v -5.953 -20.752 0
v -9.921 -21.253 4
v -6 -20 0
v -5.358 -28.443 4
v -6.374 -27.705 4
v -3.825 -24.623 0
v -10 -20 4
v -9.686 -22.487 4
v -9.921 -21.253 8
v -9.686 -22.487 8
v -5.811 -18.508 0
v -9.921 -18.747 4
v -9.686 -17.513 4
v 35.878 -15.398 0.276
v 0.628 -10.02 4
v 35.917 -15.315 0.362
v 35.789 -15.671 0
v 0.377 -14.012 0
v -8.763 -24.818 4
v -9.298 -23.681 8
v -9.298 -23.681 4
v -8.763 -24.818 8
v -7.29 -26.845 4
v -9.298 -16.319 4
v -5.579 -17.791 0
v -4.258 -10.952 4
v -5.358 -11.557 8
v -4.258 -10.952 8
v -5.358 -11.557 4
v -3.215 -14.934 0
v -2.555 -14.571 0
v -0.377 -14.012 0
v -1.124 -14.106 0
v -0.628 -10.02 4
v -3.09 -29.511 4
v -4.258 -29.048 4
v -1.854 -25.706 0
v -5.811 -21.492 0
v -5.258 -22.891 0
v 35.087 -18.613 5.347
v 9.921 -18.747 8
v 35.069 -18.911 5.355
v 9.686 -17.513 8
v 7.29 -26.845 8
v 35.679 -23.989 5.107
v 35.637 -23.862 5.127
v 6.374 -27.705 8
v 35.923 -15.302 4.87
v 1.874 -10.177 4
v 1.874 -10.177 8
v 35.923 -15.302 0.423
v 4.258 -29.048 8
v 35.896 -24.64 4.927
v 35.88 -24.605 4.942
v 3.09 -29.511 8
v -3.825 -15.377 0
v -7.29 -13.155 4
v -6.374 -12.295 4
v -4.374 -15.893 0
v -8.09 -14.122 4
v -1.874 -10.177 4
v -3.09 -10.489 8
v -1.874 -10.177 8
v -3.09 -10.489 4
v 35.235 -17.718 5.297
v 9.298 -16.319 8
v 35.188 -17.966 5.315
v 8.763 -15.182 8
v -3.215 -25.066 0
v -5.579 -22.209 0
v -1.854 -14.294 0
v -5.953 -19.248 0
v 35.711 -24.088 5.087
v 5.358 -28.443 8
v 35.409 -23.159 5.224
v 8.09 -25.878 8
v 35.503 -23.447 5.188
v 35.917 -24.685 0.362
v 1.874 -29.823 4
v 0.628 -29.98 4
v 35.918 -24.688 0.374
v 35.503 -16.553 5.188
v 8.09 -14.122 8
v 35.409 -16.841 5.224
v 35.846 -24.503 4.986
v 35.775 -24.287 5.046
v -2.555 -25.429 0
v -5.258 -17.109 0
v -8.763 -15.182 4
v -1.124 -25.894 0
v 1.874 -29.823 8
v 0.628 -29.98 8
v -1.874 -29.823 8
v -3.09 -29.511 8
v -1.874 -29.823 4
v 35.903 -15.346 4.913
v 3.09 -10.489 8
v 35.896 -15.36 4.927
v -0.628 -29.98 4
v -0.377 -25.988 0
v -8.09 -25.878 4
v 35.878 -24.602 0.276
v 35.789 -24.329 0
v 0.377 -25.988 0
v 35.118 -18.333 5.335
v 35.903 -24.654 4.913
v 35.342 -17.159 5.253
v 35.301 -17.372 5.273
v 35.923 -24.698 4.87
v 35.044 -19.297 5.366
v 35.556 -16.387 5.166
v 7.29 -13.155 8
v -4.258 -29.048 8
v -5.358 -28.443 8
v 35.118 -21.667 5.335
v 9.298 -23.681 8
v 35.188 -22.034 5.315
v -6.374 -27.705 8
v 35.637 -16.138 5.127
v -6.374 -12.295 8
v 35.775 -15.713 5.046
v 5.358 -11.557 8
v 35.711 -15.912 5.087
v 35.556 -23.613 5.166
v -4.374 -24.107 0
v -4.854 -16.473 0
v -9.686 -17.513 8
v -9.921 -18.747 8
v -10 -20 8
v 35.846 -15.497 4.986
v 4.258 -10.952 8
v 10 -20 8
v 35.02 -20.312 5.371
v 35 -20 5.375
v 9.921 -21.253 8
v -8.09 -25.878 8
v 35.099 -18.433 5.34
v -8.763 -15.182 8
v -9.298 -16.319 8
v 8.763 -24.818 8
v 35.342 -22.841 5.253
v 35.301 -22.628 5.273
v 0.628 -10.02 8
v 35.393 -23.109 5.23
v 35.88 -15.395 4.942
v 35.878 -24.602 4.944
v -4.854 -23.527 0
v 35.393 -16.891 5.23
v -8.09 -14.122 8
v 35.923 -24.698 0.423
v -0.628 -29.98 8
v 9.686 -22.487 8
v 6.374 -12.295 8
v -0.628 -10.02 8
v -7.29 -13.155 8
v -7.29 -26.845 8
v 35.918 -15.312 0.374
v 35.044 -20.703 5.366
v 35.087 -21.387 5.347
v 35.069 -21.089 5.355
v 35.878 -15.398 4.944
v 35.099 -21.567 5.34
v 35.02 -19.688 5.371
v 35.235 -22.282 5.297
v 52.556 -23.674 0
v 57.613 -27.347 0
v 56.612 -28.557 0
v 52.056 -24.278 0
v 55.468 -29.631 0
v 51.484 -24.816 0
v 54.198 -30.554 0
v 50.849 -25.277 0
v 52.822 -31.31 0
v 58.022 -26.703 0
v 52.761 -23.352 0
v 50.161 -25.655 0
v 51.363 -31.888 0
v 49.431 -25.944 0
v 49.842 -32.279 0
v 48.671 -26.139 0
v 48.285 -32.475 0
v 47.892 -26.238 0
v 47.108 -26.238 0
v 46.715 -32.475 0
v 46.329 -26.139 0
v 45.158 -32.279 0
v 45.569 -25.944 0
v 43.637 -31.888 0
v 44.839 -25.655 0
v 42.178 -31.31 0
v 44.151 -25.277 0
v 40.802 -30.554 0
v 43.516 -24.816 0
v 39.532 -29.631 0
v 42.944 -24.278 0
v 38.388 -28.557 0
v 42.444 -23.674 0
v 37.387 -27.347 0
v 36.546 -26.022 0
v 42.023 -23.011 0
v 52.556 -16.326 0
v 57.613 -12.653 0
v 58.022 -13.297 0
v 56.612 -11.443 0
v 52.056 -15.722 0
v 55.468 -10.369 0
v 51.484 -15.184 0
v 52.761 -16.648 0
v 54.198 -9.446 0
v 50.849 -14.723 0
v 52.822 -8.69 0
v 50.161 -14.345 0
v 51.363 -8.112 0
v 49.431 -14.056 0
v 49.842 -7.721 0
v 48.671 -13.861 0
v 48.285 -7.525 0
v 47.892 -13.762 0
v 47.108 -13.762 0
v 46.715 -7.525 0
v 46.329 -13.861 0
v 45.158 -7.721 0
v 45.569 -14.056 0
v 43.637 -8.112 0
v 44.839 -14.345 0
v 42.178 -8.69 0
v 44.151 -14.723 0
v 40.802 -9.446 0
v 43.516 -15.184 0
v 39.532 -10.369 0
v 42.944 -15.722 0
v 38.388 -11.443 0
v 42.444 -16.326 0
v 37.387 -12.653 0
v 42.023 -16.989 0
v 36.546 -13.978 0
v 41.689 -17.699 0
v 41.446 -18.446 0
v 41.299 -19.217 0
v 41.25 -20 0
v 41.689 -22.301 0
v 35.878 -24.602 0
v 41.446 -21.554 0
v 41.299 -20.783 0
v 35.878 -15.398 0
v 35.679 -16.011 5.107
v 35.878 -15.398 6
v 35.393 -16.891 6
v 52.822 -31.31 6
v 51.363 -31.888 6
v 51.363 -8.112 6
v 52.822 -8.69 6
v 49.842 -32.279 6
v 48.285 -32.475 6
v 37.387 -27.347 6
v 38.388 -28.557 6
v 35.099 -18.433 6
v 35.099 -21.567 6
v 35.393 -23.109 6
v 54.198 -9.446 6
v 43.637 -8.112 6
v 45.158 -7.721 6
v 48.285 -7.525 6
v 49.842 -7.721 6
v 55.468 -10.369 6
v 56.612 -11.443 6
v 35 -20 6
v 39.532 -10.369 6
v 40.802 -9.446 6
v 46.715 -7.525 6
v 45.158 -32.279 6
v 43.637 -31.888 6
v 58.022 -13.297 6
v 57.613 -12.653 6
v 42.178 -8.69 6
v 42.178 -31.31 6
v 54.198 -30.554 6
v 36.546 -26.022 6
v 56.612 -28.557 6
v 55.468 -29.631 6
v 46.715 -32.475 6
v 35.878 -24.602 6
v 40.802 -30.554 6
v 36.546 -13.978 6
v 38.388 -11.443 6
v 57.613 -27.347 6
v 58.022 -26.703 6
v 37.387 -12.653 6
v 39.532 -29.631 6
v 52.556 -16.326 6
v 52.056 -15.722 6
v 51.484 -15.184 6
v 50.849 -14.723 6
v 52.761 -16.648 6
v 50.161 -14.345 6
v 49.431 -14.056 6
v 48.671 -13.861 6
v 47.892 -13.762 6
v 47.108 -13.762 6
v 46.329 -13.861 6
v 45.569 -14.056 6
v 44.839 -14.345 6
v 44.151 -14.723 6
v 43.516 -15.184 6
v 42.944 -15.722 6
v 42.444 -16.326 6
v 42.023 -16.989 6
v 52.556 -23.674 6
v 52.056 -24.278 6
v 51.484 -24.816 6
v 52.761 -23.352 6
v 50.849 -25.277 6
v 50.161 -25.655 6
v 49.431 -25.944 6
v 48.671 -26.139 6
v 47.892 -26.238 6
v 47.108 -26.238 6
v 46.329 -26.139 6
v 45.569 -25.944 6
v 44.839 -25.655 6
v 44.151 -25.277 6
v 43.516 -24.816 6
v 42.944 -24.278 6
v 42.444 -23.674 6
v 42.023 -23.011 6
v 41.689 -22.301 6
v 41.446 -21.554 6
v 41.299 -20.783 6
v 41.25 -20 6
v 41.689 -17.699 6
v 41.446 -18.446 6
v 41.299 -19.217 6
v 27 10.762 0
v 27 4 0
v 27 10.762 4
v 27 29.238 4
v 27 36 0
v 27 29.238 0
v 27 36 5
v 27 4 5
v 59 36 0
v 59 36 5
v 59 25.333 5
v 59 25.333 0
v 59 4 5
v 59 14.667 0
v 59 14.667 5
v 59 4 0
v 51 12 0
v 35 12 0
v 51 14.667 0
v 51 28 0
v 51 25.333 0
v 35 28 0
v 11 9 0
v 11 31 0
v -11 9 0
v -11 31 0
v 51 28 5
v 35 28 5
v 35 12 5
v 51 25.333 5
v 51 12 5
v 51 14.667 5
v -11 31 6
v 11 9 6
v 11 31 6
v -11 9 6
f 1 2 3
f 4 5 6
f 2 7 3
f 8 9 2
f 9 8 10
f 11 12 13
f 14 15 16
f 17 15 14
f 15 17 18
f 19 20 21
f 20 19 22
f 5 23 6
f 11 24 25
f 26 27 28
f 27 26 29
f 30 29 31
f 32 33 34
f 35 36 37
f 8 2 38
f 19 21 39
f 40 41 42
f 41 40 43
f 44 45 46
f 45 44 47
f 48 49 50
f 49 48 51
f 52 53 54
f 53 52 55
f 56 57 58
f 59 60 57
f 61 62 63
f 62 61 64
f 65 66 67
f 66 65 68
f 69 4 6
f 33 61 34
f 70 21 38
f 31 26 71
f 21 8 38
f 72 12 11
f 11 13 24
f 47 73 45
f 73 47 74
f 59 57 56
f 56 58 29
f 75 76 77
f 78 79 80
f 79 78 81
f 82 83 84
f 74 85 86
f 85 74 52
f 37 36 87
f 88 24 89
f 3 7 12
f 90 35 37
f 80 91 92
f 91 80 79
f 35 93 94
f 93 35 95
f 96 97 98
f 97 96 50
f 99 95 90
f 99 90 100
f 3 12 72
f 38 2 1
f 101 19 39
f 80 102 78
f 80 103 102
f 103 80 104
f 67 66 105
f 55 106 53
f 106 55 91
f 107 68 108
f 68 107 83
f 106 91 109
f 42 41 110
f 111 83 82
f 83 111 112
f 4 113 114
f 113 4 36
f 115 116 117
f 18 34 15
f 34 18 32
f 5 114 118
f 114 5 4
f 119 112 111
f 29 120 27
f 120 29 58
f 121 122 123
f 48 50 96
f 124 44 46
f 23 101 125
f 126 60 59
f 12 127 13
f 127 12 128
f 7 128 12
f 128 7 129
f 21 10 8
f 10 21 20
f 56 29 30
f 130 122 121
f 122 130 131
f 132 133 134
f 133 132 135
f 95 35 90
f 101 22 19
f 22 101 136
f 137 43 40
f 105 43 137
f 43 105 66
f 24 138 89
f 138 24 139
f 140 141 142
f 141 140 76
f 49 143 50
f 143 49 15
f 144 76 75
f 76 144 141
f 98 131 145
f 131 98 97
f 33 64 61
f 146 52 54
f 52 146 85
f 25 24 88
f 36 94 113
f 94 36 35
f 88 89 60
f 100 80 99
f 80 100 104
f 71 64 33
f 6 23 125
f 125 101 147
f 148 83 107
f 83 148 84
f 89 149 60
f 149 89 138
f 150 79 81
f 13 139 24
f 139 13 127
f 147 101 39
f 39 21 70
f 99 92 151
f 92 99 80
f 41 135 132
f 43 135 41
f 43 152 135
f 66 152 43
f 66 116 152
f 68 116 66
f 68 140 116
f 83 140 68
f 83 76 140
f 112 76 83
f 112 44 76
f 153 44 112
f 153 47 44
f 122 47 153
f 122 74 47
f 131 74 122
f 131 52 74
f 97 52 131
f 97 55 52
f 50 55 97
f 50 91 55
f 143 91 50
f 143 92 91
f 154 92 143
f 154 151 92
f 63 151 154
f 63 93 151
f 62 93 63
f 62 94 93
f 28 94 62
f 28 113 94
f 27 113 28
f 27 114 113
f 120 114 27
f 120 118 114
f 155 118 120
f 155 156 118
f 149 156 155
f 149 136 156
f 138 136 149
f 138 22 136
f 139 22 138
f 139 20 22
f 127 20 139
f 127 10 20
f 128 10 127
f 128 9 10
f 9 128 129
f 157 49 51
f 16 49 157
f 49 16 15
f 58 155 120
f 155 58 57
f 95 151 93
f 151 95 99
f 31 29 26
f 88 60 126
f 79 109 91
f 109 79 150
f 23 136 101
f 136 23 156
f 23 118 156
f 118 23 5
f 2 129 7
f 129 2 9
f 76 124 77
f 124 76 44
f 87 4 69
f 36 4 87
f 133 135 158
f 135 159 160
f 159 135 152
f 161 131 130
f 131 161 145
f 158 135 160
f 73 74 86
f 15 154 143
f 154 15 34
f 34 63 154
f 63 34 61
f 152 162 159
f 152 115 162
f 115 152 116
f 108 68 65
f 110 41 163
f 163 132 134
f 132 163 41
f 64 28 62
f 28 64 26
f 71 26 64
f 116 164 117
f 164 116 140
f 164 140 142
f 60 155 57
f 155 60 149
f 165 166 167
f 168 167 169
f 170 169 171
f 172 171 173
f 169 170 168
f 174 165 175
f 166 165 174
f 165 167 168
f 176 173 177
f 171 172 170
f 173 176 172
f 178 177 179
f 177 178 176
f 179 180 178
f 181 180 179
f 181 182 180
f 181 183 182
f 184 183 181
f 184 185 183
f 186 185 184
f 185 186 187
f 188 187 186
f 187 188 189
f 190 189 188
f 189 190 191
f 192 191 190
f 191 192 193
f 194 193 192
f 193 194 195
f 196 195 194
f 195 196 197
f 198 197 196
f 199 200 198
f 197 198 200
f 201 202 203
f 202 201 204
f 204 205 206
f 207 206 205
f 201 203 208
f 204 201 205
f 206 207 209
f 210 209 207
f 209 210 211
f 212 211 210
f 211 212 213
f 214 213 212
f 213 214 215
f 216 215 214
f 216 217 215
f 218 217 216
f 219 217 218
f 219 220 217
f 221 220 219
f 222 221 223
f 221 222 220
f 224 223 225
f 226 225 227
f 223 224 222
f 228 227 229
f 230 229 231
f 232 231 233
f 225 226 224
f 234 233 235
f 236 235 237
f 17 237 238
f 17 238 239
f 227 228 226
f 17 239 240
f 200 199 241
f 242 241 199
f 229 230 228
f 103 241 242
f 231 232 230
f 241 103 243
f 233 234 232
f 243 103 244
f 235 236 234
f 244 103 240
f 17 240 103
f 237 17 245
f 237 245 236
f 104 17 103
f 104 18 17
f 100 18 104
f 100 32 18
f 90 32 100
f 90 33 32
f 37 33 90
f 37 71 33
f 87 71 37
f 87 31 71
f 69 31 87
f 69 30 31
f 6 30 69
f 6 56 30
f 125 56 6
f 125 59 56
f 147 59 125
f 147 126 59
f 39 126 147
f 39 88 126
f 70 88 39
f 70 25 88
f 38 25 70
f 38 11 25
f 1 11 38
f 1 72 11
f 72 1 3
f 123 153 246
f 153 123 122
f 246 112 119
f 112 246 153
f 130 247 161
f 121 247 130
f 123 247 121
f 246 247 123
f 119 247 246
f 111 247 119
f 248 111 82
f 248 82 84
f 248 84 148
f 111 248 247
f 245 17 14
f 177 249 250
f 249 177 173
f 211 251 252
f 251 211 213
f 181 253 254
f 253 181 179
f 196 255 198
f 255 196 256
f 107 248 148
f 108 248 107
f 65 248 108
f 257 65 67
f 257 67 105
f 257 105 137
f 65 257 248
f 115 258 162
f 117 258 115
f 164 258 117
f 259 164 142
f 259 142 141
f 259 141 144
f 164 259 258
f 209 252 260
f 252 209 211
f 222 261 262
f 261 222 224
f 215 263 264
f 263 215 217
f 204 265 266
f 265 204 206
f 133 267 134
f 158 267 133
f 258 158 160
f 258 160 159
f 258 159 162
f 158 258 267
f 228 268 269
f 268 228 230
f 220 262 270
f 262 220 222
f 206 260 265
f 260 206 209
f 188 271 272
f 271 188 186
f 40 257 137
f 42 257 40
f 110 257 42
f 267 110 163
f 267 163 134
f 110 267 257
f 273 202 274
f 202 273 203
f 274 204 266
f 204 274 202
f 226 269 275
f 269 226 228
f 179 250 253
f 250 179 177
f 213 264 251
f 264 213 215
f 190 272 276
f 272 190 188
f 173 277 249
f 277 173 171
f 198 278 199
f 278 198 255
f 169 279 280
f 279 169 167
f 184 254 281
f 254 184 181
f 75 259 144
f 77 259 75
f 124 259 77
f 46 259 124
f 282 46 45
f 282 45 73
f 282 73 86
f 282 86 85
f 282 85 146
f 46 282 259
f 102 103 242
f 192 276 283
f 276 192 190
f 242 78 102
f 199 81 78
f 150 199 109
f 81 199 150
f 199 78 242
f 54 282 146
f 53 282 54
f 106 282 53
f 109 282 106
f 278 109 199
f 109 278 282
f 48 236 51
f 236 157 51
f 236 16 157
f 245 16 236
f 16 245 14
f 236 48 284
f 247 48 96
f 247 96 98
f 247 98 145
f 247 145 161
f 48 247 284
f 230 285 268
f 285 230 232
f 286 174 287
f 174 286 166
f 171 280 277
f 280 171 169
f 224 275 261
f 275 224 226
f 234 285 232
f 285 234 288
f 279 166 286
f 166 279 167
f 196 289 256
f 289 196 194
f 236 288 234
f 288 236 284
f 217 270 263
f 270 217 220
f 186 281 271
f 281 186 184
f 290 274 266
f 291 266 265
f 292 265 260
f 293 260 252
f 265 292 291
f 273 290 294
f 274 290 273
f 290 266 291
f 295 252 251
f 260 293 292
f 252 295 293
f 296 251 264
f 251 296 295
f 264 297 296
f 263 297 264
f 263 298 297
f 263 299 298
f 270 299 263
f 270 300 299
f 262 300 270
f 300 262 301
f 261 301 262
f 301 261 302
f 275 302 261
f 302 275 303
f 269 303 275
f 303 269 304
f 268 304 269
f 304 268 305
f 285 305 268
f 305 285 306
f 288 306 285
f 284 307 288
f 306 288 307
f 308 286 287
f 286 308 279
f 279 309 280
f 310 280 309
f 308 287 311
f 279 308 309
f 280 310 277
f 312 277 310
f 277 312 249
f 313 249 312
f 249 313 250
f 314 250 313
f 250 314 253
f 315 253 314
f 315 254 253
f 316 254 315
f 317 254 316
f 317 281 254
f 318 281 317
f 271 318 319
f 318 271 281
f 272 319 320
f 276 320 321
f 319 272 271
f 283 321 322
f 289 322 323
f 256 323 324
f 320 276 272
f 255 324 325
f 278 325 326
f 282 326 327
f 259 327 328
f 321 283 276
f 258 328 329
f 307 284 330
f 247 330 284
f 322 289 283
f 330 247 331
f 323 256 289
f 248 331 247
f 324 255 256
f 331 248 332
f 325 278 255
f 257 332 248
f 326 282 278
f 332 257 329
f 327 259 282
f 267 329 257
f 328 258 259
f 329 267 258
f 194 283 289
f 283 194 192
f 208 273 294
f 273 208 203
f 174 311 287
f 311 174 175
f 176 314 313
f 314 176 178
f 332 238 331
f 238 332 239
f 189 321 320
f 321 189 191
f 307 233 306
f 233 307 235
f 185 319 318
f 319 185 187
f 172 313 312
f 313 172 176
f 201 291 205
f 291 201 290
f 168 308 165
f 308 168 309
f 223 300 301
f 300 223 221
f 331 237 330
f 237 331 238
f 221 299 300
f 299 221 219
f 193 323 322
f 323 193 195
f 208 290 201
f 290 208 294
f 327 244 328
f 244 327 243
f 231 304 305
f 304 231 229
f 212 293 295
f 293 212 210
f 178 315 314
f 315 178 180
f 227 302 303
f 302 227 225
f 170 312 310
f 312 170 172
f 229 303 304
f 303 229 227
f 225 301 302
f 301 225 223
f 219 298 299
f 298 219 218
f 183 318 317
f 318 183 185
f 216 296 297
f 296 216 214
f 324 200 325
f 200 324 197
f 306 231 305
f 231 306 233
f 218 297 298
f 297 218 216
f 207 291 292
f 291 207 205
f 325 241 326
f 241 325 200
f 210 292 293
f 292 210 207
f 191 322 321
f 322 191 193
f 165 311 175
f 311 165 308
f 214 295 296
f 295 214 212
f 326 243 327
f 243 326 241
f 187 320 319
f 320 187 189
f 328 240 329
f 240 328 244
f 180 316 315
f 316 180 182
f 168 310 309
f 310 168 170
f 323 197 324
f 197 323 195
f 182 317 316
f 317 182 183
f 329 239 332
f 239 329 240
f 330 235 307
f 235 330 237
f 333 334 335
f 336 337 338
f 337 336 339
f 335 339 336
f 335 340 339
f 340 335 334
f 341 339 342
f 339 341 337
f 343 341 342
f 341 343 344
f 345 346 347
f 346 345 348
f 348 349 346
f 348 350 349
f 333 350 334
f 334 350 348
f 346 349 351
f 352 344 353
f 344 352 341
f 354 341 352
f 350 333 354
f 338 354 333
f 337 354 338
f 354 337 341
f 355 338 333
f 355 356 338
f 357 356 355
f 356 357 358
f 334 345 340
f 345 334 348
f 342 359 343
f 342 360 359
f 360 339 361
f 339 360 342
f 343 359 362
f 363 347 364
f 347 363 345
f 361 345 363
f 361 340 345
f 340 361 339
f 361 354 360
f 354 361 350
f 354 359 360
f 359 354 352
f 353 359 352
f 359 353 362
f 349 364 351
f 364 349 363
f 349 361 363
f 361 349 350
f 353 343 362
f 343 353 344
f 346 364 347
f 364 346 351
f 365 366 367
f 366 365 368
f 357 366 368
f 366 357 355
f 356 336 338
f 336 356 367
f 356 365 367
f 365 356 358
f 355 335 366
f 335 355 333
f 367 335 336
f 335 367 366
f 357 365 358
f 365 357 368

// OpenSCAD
// file: ../utilities/transformations_oblomobka.scad
// Transformations
// (C) @oblomobka - 2014
// GPL3

// Transforma una forma en un sector según un ángulo dado.

module sector(	angle, 	// es el ángulo del sector, lo que quedará de la forma original
				d,		// valor auxiliar, será como mínimo igual al diámetro del cilindro que envuelve la forma original
				h		// valor auxiliar, será como mínimo igual a la altura del cilindro que envuelve la forma original
				){

POINTS=[	[0,0,-h],
		[0,0,h],
		[d*cos(0*angle/4),d*sin(0*angle/4),-h],
		[d*cos(0*angle/4),d*sin(0*angle/4),h],
		[d*cos(1*angle/4),d*sin(1*angle/4),-h],
		[d*cos(1*angle/4),d*sin(1*angle/4),h],
		[d*cos(2*angle/4),d*sin(2*angle/4),-h],
		[d*cos(2*angle/4),d*sin(2*angle/4),h],
		[d*cos(3*angle/4),d*sin(3*angle/4),-h],
		[d*cos(3*angle/4),d*sin(3*angle/4),h],
		[d*cos(4*angle/4),d*sin(4*angle/4),-h],
		[d*cos(4*angle/4),d*sin(4*angle/4),h],
		];

TRIANGLES=[	[0,1,2],
			[1,3,2],
			[2,3,4],
			[3,5,4],
			[4,5,6],
			[5,7,6],
			[6,7,8],
			[7,9,8],
			[8,9,10],
			[9,11,10],
			[10,11,0],
			[11,1,0],

			[5,3,1],
			[7,5,1],
			[9,7,1],
			[11,9,1],
			[0,2,4],
			[0,4,6],
			[0,6,8],
			[0,8,10]
			];

if(angle<=0 || angle>=360){
	child();
	}
	else{
		intersection(){
			polyhedron(points=POINTS,triangles=TRIANGLES);
			child();
			}
		}
}

//sector (150,40,10)cylinder(r=20,h=10); // Ejemplo de uso de la tansformación sector()
// file: ../utilities/functions_ext.scad
// Funciones sacadas de otras librerías y de diferentes autores

include <constants_oblomobka.scad>

/* A circular helix of radius a and pitch 2πb is described by the following parametrisation:
x(t) = a*cos(t),
y(t) = a*sin(t),
z(t) = b*t
Licensed under the MIT license.
© 2010 by Elmo Mäntynen
*/
function b(pitch) = pitch/(TAU);
function t(pitch, z) = z/b(pitch);
function helix_curve(pitch, radius, z) = [radius*cos(deg(t(pitch, z))), radius*sin(deg(t(pitch, z))), z];


/* Utility functions.
 * Originally by Hans Häggström, 2010.
 * Dual licenced under Creative Commons Attribution-Share Alike 3.0 and LGPL2 or later
 */
function distance(a, b) = sqrt( (a[0] - b[0])*(a[0] - b[0]) +
                                (a[1] - b[1])*(a[1] - b[1]) +
                                (a[2] - b[2])*(a[2] - b[2]) );

function length2(a) = sqrt( a[0]*a[0] + a[1]*a[1] );

function normalized(a) = a / (max(distance([0,0,0], a), 0.00001));

function normalized_axis(a) = 	a == "x" ? [1, 0, 0]:
                  			 	a == "y" ? [0, 1, 0]:
                   				a == "z" ? [0, 0, 1]: normalized(a);

function angleOfNormalizedVector(n) = [0, -atan2(n[2], length2([n[0], n[1]])), atan2(n[1], n[0]) ];

function angle(v) = angleOfNormalizedVector(normalized(v));

function angleBetweenTwoPoints(a, b) = angle(normalized(b-a));
// file: ../utilities/constants_oblomobka.scad
// números transcendentes

TAU = 2*PI; //6.2831853071 (PI ya está definido en Openscad)
EULER=2.71828282;


// números algebraicos

PHI=(1+sqrt(5))/2;


// Vectores

X = [1, 0, 0];
Y = [0, 1, 0];
Z = [0, 0, 1];
// file: ../utilities/shapes_oblomobka.scad
// Shapes
// (C) @oblomobka - 2014
// GPL3

include <constants_oblomobka.scad>
include <functions_oblomobka.scad>
include <functions_ext.scad>

use <transformations_oblomobka.scad>

// --- Piramide con base circunscrita en un círculo definido en las variables
module pyramid_circumscribed (	n=4,			// nº lados de la base de la pirámide	
								d1=20,		// diámetro del círculo-base donde se circunscribe la pirámide
								d2=0,		// diámetro del círculo-punta donde se circunscribe la pirámide
								h=10			// altura de la pirámide
								){

if(n%2==0){
	rotate([0,0,180/n])
		cylinder (r1=d1/2/cos(180/n), r2=d2/2/cos(180/n), h=h, $fn=n);
	}
	else{
		rotate([0,0,90/n])
			cylinder (r1=d1/2/cos(180/n), r2=d2/2/cos(180/n), h=h, $fn=n);
		}

}
// ------- pyramid_circumscribed (n=n,d1=d1,d2=d2,h=h); -----------------

// --- Prisma con base circunscrita en un círculo definido en las variables
module prism_circumscribed (	n=4,			// nº lados de la base del prisma
							d=20,		// diámetro del círculo donde se circunscribe el prisma
							h=10			// altura del prisma
							){
if(n%2==0){
	rotate([0,0,180/n])
		cylinder (r=d/2/cos(180/n), h=h, $fn=n);
	}
	else{
		rotate([0,0,90/n])
			cylinder (r=d/2/cos(180/n), h=h, $fn=n);
		}
}
// ------- prism_circumscribed (n=n,d=d,h=h); -----------------



// Toros

// Definido por el diámetro exterior y el diámetro del círculo en revolución
module torusOD (d1,d2,resolution){
$fn=resolution;	
rotate_extrude(){
	translate([d1/2-d2/2,0,0])
		circle(r=d2/2);
	}
}

// Definido por el diámetro exterior y el diámetro interior
module torusOI (d1,d2,resolution){
$fn=resolution;	
d=(d1-d2)/2;
rotate_extrude(){
	translate([d1/2-d/2,0,0])
		circle(r=d/2);
	}
}

// Definido por el diámetro de la línea neutra y el diámetro del círculo en revolución
module torusND (d1,d2,resolution){
$fn=resolution;	
rotate_extrude(){
	translate([d1/2,0,0])
		circle(r=d2/2);
	}
}

module torus_sector(d1,d2,angle=360,mode=1,extreme=true,resolution=32){

if(angle<=0 || angle>=360){
	if(mode==1){torusOD(d1,d2,resolution=resolution);}
	else{if(mode==2){torusND(d1,d2,resolution=resolution);}
	else{if(mode==3){torusOI(d1,d2,resolution=resolution);}}}
	}

else{
	if(mode==1){
		union(){
			sector(angle,d1,d2/2)torusOD(d1,d2,resolution=resolution);
			if(extreme==true){
				translate([d1/2-d2/2,0,0])sphere(d2/2,$fn=resolution);
				translate([(d1/2-d2/2)*cos(angle),(d1/2-d2/2)*sin(angle),0])sphere(d2/2,$fn=resolution);
				}
			}
		}
	else{
		if(mode==2){
			union(){
				sector(angle,d1+d2,d2/2)torusND(d1,d2,resolution=resolution);
				if(extreme==true){
					translate([d1/2,0,0])sphere(d2/2,$fn=resolution);
					translate([d1/2*cos(angle),d1/2*sin(angle),0])sphere(d2/2,$fn=resolution);
					}
				}
			}
		else{
			if(mode==3){
				union(){
					sector(angle,d1,(d1-d2)/4)torusOI(d1,d2,resolution=resolution);
					if(extreme==true){
						translate([d1/2-(d1-d2)/4,0,0])sphere((d1-d2)/4,$fn=resolution);
						translate([(d1/2-(d1-d2)/4)*cos(angle),(d1/2-(d1-d2)/4)*sin(angle),0])sphere((d1-d2)/4,$fn=resolution);
						}
					}
				}
			}
		}
	}
}


// Tubos

module tubeOT (d,t,h,resolution=resolution){	
	difference(){
		cylinder(r=d/2,h=h,$fn=resolution);
		cylinder(r=(d-2*t)/2,h=3*h,center=true,$fn=resolution);
		}
}

// Definido por el diámetro exterior y el diámetro interior
module tubeOI (d1,d2,h,resolution=resolution){
	difference(){
		cylinder(r=d1/2,h=h,$fn=resolution);
		cylinder(r=d2/2,h=3*h,center=true,$fn=resolution);	
		}
}

// Definido por el diámetro de la línea neutra y el diámetro del círculo en revolución
module tubeNT (d,t,h,resolution=resolution){
	difference(){
		cylinder(r=(d+t)/2,h=h,$fn=resolution);
		cylinder(r=(d-t)/2,h=3*h,center=true,$fn=resolution);
	}
}

module tube_sector(d=25,t=2,h=1,angle=360,mode=1,extreme=true,resolution=32){

if(angle<=0 || angle>=360){
	if(mode==1){tubeOT(d,t,h,resolution=resolution);}
	else{if(mode==2){tubeNT(d,t,h,resolution=resolution);}
	else{if(mode==3){tubeOI(d,t,h,resolution=resolution);}}}
	}

else{
	if(mode==1){
		union(){
			sector(angle,d,h)tubeOT(d,t,h,resolution=resolution);
			if(extreme==true){
				translate([d/2-t/2,0,0])cylinder(r=t/2,h=h,$fn=resolution);
				translate([(d/2-t/2)*cos(angle),(d/2-t/2)*sin(angle),0])cylinder(r=t/2,h=h,$fn=resolution);;
				}
			}
		}
	else{
		if(mode==2){
			union(){
				sector(angle,d+t,h)tubeNT(d,t,h,resolution=resolution);
				if(extreme==true){
					translate([d/2,0,0])cylinder(r=t/2,h=h,$fn=resolution);
					translate([d/2*cos(angle),d/2*sin(angle),0])cylinder(r=t/2,h=h,$fn=resolution);
					}
				}
			}
		else{
			if(mode==3){
				union(){
					sector(angle,d,h)tubeOI(d,t,h,resolution=resolution);
					if(extreme==true){
						translate([d/2-(d-t)/4,0,0])cylinder(r=(d-t)/4,h=h,$fn=resolution);
						translate([(d/2-(d-t)/4)*cos(angle),(d/2-(d-t)/4)*sin(angle),0])cylinder(r=(d-t)/4,h=h,$fn=resolution);
						}
					}
				}
			}
		}
	}
}

//torus_sector(d1=15,d2=4,angle=215,mode=3,extreme=true,resolution=50);
//tube_sector(d=24,t=11,h=15,angle=250,mode=1,extreme=true,resolution=50);

pyramid_circumscribed(n=10,d=8,h=4);
// file: ../utilities/functions_oblomobka.scad
// Functions
// (C) @oblomobka - 2014
// GPL3

include <constants_oblomobka.scad>

// da el diámetro interior del cono(d1,d2,h) a una altura interior(hi) conocida
function di_cone(d1,d2,h,hi)=d2+(d1-d2)*(1-hi/h);

// da la altura interior del cono(d1,d2,h) a un diametro(di) conocido
function hi_cone(d1,d2,h,di)=-h*((di-d2)/(d1-d2)-1);

// 
function r_circle_intersection (d1,d2)=sqrt(pow(d1/2,2)-pow(d2/2,2));

// Relaciones entre radio, apotema y lado en un polígono de n lados
function side_apothem (apothem,n)=apothem*2*tan(180/n);
function apothem_radius(radius,n)=radius*cos(180/n);
function radius_apothem(apothem,n)=apothem/cos(180/n);
function side_radius (radius,n)=radius*2*sin(180/n);

// limita los posibles valores de x, que siempre estarán comprendidos entre un minimo(a) y un maximo(z)
function lim(a,x,z)=max(a,min(x,z));

// transforma angulo, radianes --> hexadecimal
function deg(angle) = 180*angle/PI;
// transforma angulo, hexadecimal --> radianes
function rad(angle) = angle*PI/180;
// file: ../utilities/limits_oblobots.scad
//PIN
	d_pin_minmax=[10,30];			//	d_pin=lim(d_pin_minmax[0],pin[0],d_pin_minmax[1]);			
	h_pin_minmax=[0,10];			//	h_pin=lim(h_pin_minmax[0],pin[1],h_pin_minmax[1]);

//LEGS & FOOTS
	d_leg_minmax=[10,30];			//	d_leg=lim(d_leg_minmax[0],leg[0],d_leg_minmax[1]);
	h_leg_minmax=[20,90];			//	h_leg=lim(h_leg_minmax[0],leg[1],h_leg_minmax[1]);	
	n_leg_minmax=[4,16];			//	n_leg=lim(n_leg_minmax[0],leg[2],n_leg_minmax[1]);
	legsposition_minmax=[0,100];	// 	legsposition=lim(legsposition_minmax[0],leg[1],legsposition_minmax[1]);

	l_foot_minmax=[24,70];		//	l_foot=lim(l_foot_minmax[0],foot[0],l_foot_minmax[1]);
	h_foot_minmax=[0,40];			//	h_foot=lim(h_foot_minmax[0],foot[1],h_foot_minmax[1]);

//HIP | WAIST
	//C
	d_hip_minmax=[25,80];			//	d_hip=lim(d_hip_minmax[0],hip[0],d_hip_minmax[1]);
	h_hip_minmax=[10,70];			//	h_hip=lim(h_pin+2,hip[1],h_hip_minmax[1]);
	f_hip_minmax=[0,100];			//	f_hip=lim(f_hip_minmax[0],hip[2],f_hip_minmax[1]);

								//	d1_waist=lim(d_pin,waist[0],d_hip);
								//	d2_waist=lim(d_pin,waist[1],d1_waist);
	h_waist_minmax=[0.3,20];		//	h_waist=lim(h_waist_minmax[0],waist[2],h_waist_minmax[1]);

	
	//Q
	x_hip_minmax=[20,90];			//	x_hip=lim(x_hip_minmax[0],hip[0],x_hip_minmax[1]);
	y_hip_minmax=[20,60];			//	y_hip=lim(y_hip_minmax[0],hip[1],y_hip_minmax[1]);
	z_hip_minmax=[10,60];			//	z_hip=lim(z_hip_minmax[0],hip[2],z_hip_minmax[1]);
	bevel_hip_minmax=[0.5,20];	//	bevel_hip=lim(bevel_hip_minmax[0],hip[3],bevel_hip_minmax[1]);

	n_waist_minmax=[4,50];		//	n_waist=lim(n_waist_minmax[0],waist[3],n_waist_minmax[1]);
								//	d1_waist=lim(d_pin,waist[0],min(x_hip,y_hip));
								//	d2_waist=lim(d_pin,waist[1],d1_waist);


//TRUNK | SHOULDER | NECK
	//C
	d1_trunk_minmax=[30,100];		//	d1_trunk=lim(d1_trunk_minmax[0],trunk[0],d1_trunk_minmax[1]); 
	d2_trunk_minmax=[30,100];		//	d2_trunk=lim(d2_trunk_minmax[0],trunk[1],d1_trunk);
	h_trunk_minmax=[24,100];		//	h_trunk=lim(h_trunk_minmax[0],trunk[2],h_trunk_minmax[1]);

	d1_shoulder_minmax=[12,50];	//	d1_shoulder=lim(d1_shoulder_minmax[0],shoulder[0],h_trunk*sin(angle_trunk));
	d_aux_shoulder_minmax=[0,10];	//	d_aux_shoulder=lim(d_aux_shoulder_minmax[0],shoulder[1],d_aux_shoulder_minmax[1]);
	h_shoulder_minmax=[0,50];		//	h_shoulder=lim(h_shoulder_minmax[0],shoulder[2],d2_trunk/2);

								//	d1_neck=lim(d_pin+2,neck[0],d2_trunk);
								//	d2_neck=lim(d_pin+2,neck[1],d1_neck);
	h_neck_minmax=[0.3,20];		//	h_neck=lim(h_neck_minmax[0],neck[2],h_neck_minmax[1]);

	//Q
	x_trunk_minmax=[20,90];		//	x_trunk=lim(x_trunk_minmax[0],trunk[0],x_trunk_minmax[1]);
	y_trunk_minmax=[20,90];		//	y_trunk=lim(d_pin+1+x_trunk/5,trunk[1],y_trunk_minmax[1]);
	z_trunk_minmax=[26,90];		//	z_trunk=lim(z_trunk_minmax[0],trunk[2],z_trunk_minmax[1]);
	
	n_neck_minmax=[4,50];			//	n_neck=lim(n_neck_minmax[0],neck[3],n_neck_minmax[1]);
								//	d1_neck=lim(d_pin+2,neck[0],min(x_trunk,y_trunk));	
								//	d2_neck=lim(d_pin+2,neck[1],d1_neck);

	//ELECTRIC TRUNK
	d_polygonal_trunk_minmax=[45,80];	//d_polygonal_trunk=lim(d_polygonal_trunk_minmax[0],trunk[0],d_polygonal_trunk_minmax[1]);							
	h_polygonal_trunk_minmax=[87,120];	//h_polygonal_trunk=lim(h_polygonal_trunk_minmax[0],trunk[1],h_polygonal_trunk_minmax[1]);
	thickness_trunk_minmax=[1,6];	//thickness_trunk=lim(thickness_trunk_minmax[0],trunk[2],thickness_trunk_minmax[1]);

// ARMS | HANDS
	// C
	d_arm_minmax=[10,40];			// 	d_arm=lim(d_arm_minmax[0],arm[0],d_arm_minmax[1]);
								//	d_arm=lim(d_pin+1,arm[0],d_arm_minmax[1]);	
	h_arm_minmax=[5,25];			// 	h_arm=lim(h_arm_minmax[0],arm[1],h_arm_minmax[1]);
	armpit_minmax=[0.3,60];		//	armpit=lim(armpit_minmax[0],arm[2],armpit_minmax[1]);
	l_arm_minmax=[20,120];		// 	l_arm=lim(d_arm+d_hand,arm[2],l_arm_minmax[1]);	

	d_hand_minmax=[10,60];		//	d_hand=lim(d_hand_minmax[0],hand[0],d_hand_minmax[1]);
	h_hand_minmax=[3,25];			//	h_hand=lim(h_hand_minmax[0],hand[1],h_arm-0.5);
	angle_hand_minmax=[0,180];	//	angle_hand=lim(angle_hand_minmax[0],hand[2]/2,angle_hand_minmax[1]);

	// Q
	x_arm_minmax=[5,25];			// 	x_arm=lim(x_arm_minmax[0],arm[1],x_arm_minmax[1]);
	y_arm_minmax=[10,40];			// 	y_arm=lim(y_arm_minmax[0],arm[0],y_arm_minmax[1]);
	z_arm_minmax=[20,120];		//	z_arm=lim(y_arm+5+d_hand,arm[2],z_arm_minmax[1]);

	n_hand_minmax=[4,12];			// 	n_hand=lim(n_hand_minmax[0],2*floor(hand[2]/2),n_hand_minmax[1]);
								//	h_hand=lim(h_hand_minmax[0],hand[1],x_arm-0.5);

// HEAD | EYES | BRAIN
	// C
	h_head_minmax=[20,100];		// 	h_head=lim(h_head_minmax[0],head[2],h_head_minmax[1]);
	d1_head_minmax=[20,60];		// 	d1_head=lim(h_head_minmax[0],head[0],h_head_minmax[1]);
	d2_head_minmax=[15,150];		// 	d2_head=lim(h_head_minmax[0],head[1],2*h_head+d1_head);

	// Q
	x_head_minmax=[20,100];		// x_head=lim(x_head_minmax[0],head[0],x_head_minmax[1]);
	y_head_minmax=[20,100];		// y_head=lim(y_head_minmax[0],head[1],y_head_minmax[1]);
	z_head_minmax=[20,100];		// z_head=lim(z_head_minmax[0],head[2],z_head_minmax[1]);

	d_eye_minmax=[5,40];			// 	d_eye=lim(d_eye_minmax[0],eye[0],(d1_head+d2_head)/2);
	h_eye_minmax=[1,10];			// 	h_eye=lim(h_eye_minmax[0],eye[1],h_eye_minmax[1]);
	edge_eye_minmax=[1,12];		//	edge_eye=lim(edge_eye_minmax[0],eye[2],d_eye/2-3);

	frown_eye_expression_minmax=[0,100];		// frown_eye_expression=lim(frown_eye_expression_minmax[0],eye_expression[1],frown_eye_expression_minmax[1]);
	bridge_eye_position_minmax=[0,100];		// bridge_eye_position=lim(bridge_eye_position_minmax[0],eye_position[0],bridge_eye_position_minmax[1]);	
	f_h_eye_position_minmax=[0,100];			// f_h_eye_position=lim(f_h_eye_position_minmax[0],eye_position[1],f_h_eye_position_minmax[1]);	

	h_brain_minmax=[0,40];			//	h_brain=lim(h_brain_minmax[0],brain[0],h_brain_minmax[1]);
	edge_brain_minmax=[0,25];			//	edge_brain=lim(edge_brain_minmax[0],brain[1],edge_brain_minmax[1]);

//BADGE
	d_badge_minmax=[20,40];		//	d_badge=lim(d_badge_minmax[0],badge[0],d_badge_minmax[1])
	h_badge_minmax=[0.5,5];		// 	h_badge=lim(h_badge_minmax[0],badge[1],h_badge_minmax[1]);
	n_badge_minmax=[4,50];		// 	n_badge=lim(n_badge_minmax[0],badge[3],n_badge_minmax[1]);
	edge_badge_minmax=[1,5];		//	edge_badge=lim(edge_badge_minmax[0],badge[2],edge_badge_minmax[1]);
// file: ../utilities/presets_oblobots.scad
//////////////////////////////////////////////////////////////////////////////////////////////////
// presets [OBLOBOTS] 
// valores predeterminados para los volúmenes de un oblobot así como de los modos de represntación
//////////////////////////////////////////////////////////////////////////////////////////////////
// (c) Jorge Medal (@oblomobka) - Sara Alvarellos (@trecedejunio) Oct 2013
//////////////////////////////////////////////////////////////////////////////////////////////////
// GPL license
//////////////////////////////////////////////////////////////////////////////////////////////////

use <functions_oblomobka.scad>


//-- CARACTERÍSTICAS DEL PIN

SIMPLE=[0,0,0];					// cilindro 

	// Pestañas en pin con punta expandible
	tab_expansion=80;
	TABWIDE=[35,35,tab_expansion];
	TABNORMAL=[50,50,tab_expansion];
	TABFINE=[65,65,tab_expansion];

/////////////////////////////////////////////
/////// REPRESENTACIÓN //////////////////////
/////////////////////////////////////////////

//-- MODOS DE REPRESENTACIÓN DE LAS PARTES 

ASSEMBLED=[0,1,0,0];
EXPLOSION=[0,1,1,1];
PRINTING=[1,0,0,2];


//-- ELECCIÓN DE LA PARTE REPRESENTADA	

ALL=[0];
LEGS=[1];
HIP=[2];
TRUNK=[3];
HEAD=[4];
ARMS=[5];
BADGES=[6];

//-- COLORES

arms_color=[1,rands(100,200,1)[0]/255,0];
legs_color=[0,rands(100,200,1)[0]/255,1];
trunk_color=[rands(0,100,1)[0]/255,rands(150,225,1)[0]/255,rands(0,100,1)[0]/255];
head_color=[220/255,rands(0,100,1)[0]/255,20/255];
badges_color=[rands(0,255,1)[0]/255,rands(0,255,1)[0]/255,rands(0,255,1)[0]/255];
hip_color=[0,(rands(100,200,1)[0])/255,1];
// file: ../utilities/external_elements_oblobots.scad
//////////////////////////////////////////////////////////////////////////////////////////////////
// external elements [OBLOBOTS] 
// librería de elementos externos comerciales (botones automáticos, espigas de madera baterías, ...) 
// que se usan en las partes de los oblobots
//////////////////////////////////////////////////////////////////////////////////////////////////
// (c) Jorge Medal (@oblomobka) - Sara Alvarellos (@trecedejunio) 2014-02
//////////////////////////////////////////////////////////////////////////////////////////////////
// GPL license
//////////////////////////////////////////////////////////////////////////////////////////////////

//-- BOTONES AUTOMÁTICOS - Press Fastener (PF)
//-- Cada código corresponde a las medidas de un modelo concreto

//XXX= [ xx,xx,xx,xx,xx,xx,xx ];		// [ 	diametro hembra,
									//		espesor hembra,
									//		diámetro alojamiento en hembra (aparece en los botones para coser),
									//		saliente del alojamiento en hembra (aparece en los botones para coser),
									//		diámetro macho,
									//		espesor macho	
									//		tipo]

NULL=[0,0,0,0,0,0,0];				// no hay botón automático 
//PON = [11.7,2.35,0,0,11.7,1.6 ];	// marca desconocida, encontrado en Pontejos (Madrid)
//PRYM10 = [11,2.2,0,0,11,2.0];		// marca PRYM - 10 mm
PRYM_SNAP_FASTENERS_11 = [10.1,1.4,3.5,3,9.1,1,2];	// marca PRYM - Snap fasteners 11mm
PRYM_SNAP_FASTENERS_9 = [8.5,1.5,3,2.7,8.1,1,2];	// marca PRYM - Snap fasteners 9mm

fit_male=0.7;

//-- Espigas de madera - DOWEL

DOWEL_8=[8,40,0,0,0,0,1];
DOWEL_6=[6,30,0,0,0,0,1];

//-- TUBOS DE PLÁSTICO

PIPE_6=[6,20,0,0,0,0,1];



//-- BATERÍAS CILÍNDRICAS

//XX= [ xx,xx ];		// [ 	diametro de la pila,
					//		longitud	de la pila	]

AA = [ 14.5, 50.5 ];
AAA = [ 10.5,44.5 ];
C = [ 26.2, 50 ];
D = [ 34.2, 61.5 ]; 
// main file
///////////////////////////////////////////////////////////////////////////////////////////////
// arm[OBLOBOTS] 
// pre-form
//////////////////////////////////////////////////////////////////////////////////////////////////
// (c) Jorge Medal (@oblomobka) - Sara Alvarellos (@trecedejunio) 2014-04 - v.10
//////////////////////////////////////////////////////////////////////////////////////////////////
// GPL license
//////////////////////////////////////////////////////////////////////////////////////////////////

include <../utilities/external_elements_oblobots.scad>
include <../utilities/presets_oblobots.scad>
include <../utilities/limits_oblobots.scad>

use <../utilities/functions_oblomobka.scad>
use <../utilities/shapes_oblomobka.scad>

//////////////////////////////////////////////////////////////////
///////////// MODULO arm_cylindrical()  //////////////////////////

module arm_cylindrical (	arm=[18,6,45],		// [d,h,l]
						hand=[27,4,120]		// [d,h,ang]
						){

// valores con límites: acotados entre un máximo y un mínimo (los valores límite están en <limits_oblobots.scad>)
d_arm=lim(d_arm_minmax[0],arm[0],d_arm_minmax[1]);			// medida del brazo: fondo
h_arm=lim(h_arm_minmax[0],arm[1],h_arm_minmax[1]);			// medida del brazo: ancho

d_hand=lim(d_hand_minmax[0],hand[0],d_hand_minmax[1]);
h_hand=lim(h_hand_minmax[0],hand[1],h_arm-0.5);
angle_hand=lim(angle_hand_minmax[0],hand[2]/2,angle_hand_minmax[1]);			//max(0,min(180,hand[2]/2));

l_arm=lim(d_arm+d_hand,arm[2],l_arm_minmax[1]);			// medida del brazo: longitud

// variables condicionadas a los valores de entrada
d_i_hand=d_hand/2;
d2_arm=d_arm-h_arm;
wrist=d_hand/3;
h_i_arm=h_arm/2;
l_i_arm=l_arm-d_arm/2-d_hand/2;

$fn=50;

// Volumen 
union(){
	difference(){
		union(){
			// brazo
			hull(){
				translate([0,0,h_arm-h_i_arm])
					cylinder(r=d_arm/2,h=h_i_arm);
				translate([0,0,0])
					cylinder(r=d2_arm/2,h=h_arm-h_i_arm);
				translate([l_i_arm-d_hand/2+wrist/2,0,0])
					cylinder(r=wrist/2,h=h_hand-1.5);
				}
			// mano
			translate([l_i_arm,0,0])
				cylinder(r1=d_hand/2,r2=(d_hand/2)*1,h=h_hand);
			}
			// hueco de la mano
			translate([l_i_arm,0,0])
				cylinder(r=d_i_hand/2,h=h_arm*2+2,center=true);
			// Garra
			for(i=[0,1]){
				mirror([0,i,0])		
					difference(){
						translate([l_i_arm,-0.01,-2])
							cube([d_hand,d_hand,2*h_arm-2]);
						translate([l_i_arm,0,-2])
							rotate([0,0,angle_hand])
								cube([d_hand,d_hand,2*h_arm-2]);
						}
				}
		}

	if(hand[2]>=180){
		for(i=[0,1]){
			mirror([0,i,0])
				translate([l_i_arm+d_hand/4,3*(d_hand-d_i_hand)/4,h_hand/2])
					cube([d_hand/2,(d_hand-d_i_hand)/2,h_hand],center=true);
			}
		}
	}
}

// -------------- Fin del módulo arm_cylindrical () -----------------------
// ------------------------------------------------------------------------


////////////////////////////////////////////////////////////////////////
/////////////////// MODULO arm_quadrangle()  ///////////////////////////

module arm_quadrangle (	arm=[10,15,70],		// [ grosor(x), fondo(y), longitud(z) ] Medidas de los Brazo
						hand=[20,5,8]
						){

x_arm=lim(x_arm_minmax[0],arm[1],x_arm_minmax[1]);					// medida del brazo: grosor
y_arm=lim(y_arm_minmax[0],arm[0],y_arm_minmax[1]);					// medida del brazo: fondo

d_hand=lim(d_hand_minmax[0],hand[0],d_hand_minmax[1]);
h_hand=lim(h_hand_minmax[0],hand[1],x_arm-0.5);
n_hand=lim(n_hand_minmax[0],2*floor(hand[2]/2),n_hand_minmax[1]);	// [4,6,8,10,12] nº de lados del polígono de la mano

z_arm=lim(y_arm+5+d_hand,arm[2],z_arm_minmax[1]);					// medida del brazo: longitud



//side=2*tan(180/tn)*td/2;		// medida del lado

wrist=2*(d_hand/2)*tan(180/max(6,n_hand));
h_wrist=h_hand-1;
z_i_arm=z_arm-(y_arm/2)-d_hand-(wrist/2);

translate([0,0,x_arm])
mirror([0,0,1])
union(){
	difference(){
		hull(){
			translate([0,0,x_arm/2])
				cube([y_arm,y_arm,x_arm],center=true);
			translate([z_i_arm,0,x_arm-h_wrist/2])
				cube([wrist,wrist,h_wrist],center=true);
			}
		// rebaje del hombro / forma poligonal
		//translate([0,0,x_arm/2+2])
			//prism_circumscribed (n=n_hand,d=2*y_arm/4,h=x_arm/2);
		}
	// Mano
	difference(){
		translate([z_i_arm+wrist/2+d_hand/2,0,x_arm-h_hand])
			prism_circumscribed (n=n_hand,d=d_hand,h=h_hand);
		translate([z_i_arm+wrist/2+d_hand/2,0,0])
			prism_circumscribed (n=n_hand,d=d_hand/2,h=x_arm*2);
		translate([z_i_arm+wrist/2+3*d_hand/4,0,x_arm])
			cube([d_hand/2+1,d_hand/3,2*x_arm],center=true);
		}
	}
}

// -------------- Fin del módulo arm_quadrangle() -------------------------------
// ------------------------------------------------------------------------------



/////////////////////////////////////////////////////////////////////////
/////////////////// Ejemplos de aplicación //////////////////////////////

i=20;

translate([0,-i,0])
	arm_cylindrical(	arm=[20,8,70],hand=[25,6,65]);

translate([0,i,0])
	arm_quadrangle(arm=[22,6,70],hand=[32,5,4]);
